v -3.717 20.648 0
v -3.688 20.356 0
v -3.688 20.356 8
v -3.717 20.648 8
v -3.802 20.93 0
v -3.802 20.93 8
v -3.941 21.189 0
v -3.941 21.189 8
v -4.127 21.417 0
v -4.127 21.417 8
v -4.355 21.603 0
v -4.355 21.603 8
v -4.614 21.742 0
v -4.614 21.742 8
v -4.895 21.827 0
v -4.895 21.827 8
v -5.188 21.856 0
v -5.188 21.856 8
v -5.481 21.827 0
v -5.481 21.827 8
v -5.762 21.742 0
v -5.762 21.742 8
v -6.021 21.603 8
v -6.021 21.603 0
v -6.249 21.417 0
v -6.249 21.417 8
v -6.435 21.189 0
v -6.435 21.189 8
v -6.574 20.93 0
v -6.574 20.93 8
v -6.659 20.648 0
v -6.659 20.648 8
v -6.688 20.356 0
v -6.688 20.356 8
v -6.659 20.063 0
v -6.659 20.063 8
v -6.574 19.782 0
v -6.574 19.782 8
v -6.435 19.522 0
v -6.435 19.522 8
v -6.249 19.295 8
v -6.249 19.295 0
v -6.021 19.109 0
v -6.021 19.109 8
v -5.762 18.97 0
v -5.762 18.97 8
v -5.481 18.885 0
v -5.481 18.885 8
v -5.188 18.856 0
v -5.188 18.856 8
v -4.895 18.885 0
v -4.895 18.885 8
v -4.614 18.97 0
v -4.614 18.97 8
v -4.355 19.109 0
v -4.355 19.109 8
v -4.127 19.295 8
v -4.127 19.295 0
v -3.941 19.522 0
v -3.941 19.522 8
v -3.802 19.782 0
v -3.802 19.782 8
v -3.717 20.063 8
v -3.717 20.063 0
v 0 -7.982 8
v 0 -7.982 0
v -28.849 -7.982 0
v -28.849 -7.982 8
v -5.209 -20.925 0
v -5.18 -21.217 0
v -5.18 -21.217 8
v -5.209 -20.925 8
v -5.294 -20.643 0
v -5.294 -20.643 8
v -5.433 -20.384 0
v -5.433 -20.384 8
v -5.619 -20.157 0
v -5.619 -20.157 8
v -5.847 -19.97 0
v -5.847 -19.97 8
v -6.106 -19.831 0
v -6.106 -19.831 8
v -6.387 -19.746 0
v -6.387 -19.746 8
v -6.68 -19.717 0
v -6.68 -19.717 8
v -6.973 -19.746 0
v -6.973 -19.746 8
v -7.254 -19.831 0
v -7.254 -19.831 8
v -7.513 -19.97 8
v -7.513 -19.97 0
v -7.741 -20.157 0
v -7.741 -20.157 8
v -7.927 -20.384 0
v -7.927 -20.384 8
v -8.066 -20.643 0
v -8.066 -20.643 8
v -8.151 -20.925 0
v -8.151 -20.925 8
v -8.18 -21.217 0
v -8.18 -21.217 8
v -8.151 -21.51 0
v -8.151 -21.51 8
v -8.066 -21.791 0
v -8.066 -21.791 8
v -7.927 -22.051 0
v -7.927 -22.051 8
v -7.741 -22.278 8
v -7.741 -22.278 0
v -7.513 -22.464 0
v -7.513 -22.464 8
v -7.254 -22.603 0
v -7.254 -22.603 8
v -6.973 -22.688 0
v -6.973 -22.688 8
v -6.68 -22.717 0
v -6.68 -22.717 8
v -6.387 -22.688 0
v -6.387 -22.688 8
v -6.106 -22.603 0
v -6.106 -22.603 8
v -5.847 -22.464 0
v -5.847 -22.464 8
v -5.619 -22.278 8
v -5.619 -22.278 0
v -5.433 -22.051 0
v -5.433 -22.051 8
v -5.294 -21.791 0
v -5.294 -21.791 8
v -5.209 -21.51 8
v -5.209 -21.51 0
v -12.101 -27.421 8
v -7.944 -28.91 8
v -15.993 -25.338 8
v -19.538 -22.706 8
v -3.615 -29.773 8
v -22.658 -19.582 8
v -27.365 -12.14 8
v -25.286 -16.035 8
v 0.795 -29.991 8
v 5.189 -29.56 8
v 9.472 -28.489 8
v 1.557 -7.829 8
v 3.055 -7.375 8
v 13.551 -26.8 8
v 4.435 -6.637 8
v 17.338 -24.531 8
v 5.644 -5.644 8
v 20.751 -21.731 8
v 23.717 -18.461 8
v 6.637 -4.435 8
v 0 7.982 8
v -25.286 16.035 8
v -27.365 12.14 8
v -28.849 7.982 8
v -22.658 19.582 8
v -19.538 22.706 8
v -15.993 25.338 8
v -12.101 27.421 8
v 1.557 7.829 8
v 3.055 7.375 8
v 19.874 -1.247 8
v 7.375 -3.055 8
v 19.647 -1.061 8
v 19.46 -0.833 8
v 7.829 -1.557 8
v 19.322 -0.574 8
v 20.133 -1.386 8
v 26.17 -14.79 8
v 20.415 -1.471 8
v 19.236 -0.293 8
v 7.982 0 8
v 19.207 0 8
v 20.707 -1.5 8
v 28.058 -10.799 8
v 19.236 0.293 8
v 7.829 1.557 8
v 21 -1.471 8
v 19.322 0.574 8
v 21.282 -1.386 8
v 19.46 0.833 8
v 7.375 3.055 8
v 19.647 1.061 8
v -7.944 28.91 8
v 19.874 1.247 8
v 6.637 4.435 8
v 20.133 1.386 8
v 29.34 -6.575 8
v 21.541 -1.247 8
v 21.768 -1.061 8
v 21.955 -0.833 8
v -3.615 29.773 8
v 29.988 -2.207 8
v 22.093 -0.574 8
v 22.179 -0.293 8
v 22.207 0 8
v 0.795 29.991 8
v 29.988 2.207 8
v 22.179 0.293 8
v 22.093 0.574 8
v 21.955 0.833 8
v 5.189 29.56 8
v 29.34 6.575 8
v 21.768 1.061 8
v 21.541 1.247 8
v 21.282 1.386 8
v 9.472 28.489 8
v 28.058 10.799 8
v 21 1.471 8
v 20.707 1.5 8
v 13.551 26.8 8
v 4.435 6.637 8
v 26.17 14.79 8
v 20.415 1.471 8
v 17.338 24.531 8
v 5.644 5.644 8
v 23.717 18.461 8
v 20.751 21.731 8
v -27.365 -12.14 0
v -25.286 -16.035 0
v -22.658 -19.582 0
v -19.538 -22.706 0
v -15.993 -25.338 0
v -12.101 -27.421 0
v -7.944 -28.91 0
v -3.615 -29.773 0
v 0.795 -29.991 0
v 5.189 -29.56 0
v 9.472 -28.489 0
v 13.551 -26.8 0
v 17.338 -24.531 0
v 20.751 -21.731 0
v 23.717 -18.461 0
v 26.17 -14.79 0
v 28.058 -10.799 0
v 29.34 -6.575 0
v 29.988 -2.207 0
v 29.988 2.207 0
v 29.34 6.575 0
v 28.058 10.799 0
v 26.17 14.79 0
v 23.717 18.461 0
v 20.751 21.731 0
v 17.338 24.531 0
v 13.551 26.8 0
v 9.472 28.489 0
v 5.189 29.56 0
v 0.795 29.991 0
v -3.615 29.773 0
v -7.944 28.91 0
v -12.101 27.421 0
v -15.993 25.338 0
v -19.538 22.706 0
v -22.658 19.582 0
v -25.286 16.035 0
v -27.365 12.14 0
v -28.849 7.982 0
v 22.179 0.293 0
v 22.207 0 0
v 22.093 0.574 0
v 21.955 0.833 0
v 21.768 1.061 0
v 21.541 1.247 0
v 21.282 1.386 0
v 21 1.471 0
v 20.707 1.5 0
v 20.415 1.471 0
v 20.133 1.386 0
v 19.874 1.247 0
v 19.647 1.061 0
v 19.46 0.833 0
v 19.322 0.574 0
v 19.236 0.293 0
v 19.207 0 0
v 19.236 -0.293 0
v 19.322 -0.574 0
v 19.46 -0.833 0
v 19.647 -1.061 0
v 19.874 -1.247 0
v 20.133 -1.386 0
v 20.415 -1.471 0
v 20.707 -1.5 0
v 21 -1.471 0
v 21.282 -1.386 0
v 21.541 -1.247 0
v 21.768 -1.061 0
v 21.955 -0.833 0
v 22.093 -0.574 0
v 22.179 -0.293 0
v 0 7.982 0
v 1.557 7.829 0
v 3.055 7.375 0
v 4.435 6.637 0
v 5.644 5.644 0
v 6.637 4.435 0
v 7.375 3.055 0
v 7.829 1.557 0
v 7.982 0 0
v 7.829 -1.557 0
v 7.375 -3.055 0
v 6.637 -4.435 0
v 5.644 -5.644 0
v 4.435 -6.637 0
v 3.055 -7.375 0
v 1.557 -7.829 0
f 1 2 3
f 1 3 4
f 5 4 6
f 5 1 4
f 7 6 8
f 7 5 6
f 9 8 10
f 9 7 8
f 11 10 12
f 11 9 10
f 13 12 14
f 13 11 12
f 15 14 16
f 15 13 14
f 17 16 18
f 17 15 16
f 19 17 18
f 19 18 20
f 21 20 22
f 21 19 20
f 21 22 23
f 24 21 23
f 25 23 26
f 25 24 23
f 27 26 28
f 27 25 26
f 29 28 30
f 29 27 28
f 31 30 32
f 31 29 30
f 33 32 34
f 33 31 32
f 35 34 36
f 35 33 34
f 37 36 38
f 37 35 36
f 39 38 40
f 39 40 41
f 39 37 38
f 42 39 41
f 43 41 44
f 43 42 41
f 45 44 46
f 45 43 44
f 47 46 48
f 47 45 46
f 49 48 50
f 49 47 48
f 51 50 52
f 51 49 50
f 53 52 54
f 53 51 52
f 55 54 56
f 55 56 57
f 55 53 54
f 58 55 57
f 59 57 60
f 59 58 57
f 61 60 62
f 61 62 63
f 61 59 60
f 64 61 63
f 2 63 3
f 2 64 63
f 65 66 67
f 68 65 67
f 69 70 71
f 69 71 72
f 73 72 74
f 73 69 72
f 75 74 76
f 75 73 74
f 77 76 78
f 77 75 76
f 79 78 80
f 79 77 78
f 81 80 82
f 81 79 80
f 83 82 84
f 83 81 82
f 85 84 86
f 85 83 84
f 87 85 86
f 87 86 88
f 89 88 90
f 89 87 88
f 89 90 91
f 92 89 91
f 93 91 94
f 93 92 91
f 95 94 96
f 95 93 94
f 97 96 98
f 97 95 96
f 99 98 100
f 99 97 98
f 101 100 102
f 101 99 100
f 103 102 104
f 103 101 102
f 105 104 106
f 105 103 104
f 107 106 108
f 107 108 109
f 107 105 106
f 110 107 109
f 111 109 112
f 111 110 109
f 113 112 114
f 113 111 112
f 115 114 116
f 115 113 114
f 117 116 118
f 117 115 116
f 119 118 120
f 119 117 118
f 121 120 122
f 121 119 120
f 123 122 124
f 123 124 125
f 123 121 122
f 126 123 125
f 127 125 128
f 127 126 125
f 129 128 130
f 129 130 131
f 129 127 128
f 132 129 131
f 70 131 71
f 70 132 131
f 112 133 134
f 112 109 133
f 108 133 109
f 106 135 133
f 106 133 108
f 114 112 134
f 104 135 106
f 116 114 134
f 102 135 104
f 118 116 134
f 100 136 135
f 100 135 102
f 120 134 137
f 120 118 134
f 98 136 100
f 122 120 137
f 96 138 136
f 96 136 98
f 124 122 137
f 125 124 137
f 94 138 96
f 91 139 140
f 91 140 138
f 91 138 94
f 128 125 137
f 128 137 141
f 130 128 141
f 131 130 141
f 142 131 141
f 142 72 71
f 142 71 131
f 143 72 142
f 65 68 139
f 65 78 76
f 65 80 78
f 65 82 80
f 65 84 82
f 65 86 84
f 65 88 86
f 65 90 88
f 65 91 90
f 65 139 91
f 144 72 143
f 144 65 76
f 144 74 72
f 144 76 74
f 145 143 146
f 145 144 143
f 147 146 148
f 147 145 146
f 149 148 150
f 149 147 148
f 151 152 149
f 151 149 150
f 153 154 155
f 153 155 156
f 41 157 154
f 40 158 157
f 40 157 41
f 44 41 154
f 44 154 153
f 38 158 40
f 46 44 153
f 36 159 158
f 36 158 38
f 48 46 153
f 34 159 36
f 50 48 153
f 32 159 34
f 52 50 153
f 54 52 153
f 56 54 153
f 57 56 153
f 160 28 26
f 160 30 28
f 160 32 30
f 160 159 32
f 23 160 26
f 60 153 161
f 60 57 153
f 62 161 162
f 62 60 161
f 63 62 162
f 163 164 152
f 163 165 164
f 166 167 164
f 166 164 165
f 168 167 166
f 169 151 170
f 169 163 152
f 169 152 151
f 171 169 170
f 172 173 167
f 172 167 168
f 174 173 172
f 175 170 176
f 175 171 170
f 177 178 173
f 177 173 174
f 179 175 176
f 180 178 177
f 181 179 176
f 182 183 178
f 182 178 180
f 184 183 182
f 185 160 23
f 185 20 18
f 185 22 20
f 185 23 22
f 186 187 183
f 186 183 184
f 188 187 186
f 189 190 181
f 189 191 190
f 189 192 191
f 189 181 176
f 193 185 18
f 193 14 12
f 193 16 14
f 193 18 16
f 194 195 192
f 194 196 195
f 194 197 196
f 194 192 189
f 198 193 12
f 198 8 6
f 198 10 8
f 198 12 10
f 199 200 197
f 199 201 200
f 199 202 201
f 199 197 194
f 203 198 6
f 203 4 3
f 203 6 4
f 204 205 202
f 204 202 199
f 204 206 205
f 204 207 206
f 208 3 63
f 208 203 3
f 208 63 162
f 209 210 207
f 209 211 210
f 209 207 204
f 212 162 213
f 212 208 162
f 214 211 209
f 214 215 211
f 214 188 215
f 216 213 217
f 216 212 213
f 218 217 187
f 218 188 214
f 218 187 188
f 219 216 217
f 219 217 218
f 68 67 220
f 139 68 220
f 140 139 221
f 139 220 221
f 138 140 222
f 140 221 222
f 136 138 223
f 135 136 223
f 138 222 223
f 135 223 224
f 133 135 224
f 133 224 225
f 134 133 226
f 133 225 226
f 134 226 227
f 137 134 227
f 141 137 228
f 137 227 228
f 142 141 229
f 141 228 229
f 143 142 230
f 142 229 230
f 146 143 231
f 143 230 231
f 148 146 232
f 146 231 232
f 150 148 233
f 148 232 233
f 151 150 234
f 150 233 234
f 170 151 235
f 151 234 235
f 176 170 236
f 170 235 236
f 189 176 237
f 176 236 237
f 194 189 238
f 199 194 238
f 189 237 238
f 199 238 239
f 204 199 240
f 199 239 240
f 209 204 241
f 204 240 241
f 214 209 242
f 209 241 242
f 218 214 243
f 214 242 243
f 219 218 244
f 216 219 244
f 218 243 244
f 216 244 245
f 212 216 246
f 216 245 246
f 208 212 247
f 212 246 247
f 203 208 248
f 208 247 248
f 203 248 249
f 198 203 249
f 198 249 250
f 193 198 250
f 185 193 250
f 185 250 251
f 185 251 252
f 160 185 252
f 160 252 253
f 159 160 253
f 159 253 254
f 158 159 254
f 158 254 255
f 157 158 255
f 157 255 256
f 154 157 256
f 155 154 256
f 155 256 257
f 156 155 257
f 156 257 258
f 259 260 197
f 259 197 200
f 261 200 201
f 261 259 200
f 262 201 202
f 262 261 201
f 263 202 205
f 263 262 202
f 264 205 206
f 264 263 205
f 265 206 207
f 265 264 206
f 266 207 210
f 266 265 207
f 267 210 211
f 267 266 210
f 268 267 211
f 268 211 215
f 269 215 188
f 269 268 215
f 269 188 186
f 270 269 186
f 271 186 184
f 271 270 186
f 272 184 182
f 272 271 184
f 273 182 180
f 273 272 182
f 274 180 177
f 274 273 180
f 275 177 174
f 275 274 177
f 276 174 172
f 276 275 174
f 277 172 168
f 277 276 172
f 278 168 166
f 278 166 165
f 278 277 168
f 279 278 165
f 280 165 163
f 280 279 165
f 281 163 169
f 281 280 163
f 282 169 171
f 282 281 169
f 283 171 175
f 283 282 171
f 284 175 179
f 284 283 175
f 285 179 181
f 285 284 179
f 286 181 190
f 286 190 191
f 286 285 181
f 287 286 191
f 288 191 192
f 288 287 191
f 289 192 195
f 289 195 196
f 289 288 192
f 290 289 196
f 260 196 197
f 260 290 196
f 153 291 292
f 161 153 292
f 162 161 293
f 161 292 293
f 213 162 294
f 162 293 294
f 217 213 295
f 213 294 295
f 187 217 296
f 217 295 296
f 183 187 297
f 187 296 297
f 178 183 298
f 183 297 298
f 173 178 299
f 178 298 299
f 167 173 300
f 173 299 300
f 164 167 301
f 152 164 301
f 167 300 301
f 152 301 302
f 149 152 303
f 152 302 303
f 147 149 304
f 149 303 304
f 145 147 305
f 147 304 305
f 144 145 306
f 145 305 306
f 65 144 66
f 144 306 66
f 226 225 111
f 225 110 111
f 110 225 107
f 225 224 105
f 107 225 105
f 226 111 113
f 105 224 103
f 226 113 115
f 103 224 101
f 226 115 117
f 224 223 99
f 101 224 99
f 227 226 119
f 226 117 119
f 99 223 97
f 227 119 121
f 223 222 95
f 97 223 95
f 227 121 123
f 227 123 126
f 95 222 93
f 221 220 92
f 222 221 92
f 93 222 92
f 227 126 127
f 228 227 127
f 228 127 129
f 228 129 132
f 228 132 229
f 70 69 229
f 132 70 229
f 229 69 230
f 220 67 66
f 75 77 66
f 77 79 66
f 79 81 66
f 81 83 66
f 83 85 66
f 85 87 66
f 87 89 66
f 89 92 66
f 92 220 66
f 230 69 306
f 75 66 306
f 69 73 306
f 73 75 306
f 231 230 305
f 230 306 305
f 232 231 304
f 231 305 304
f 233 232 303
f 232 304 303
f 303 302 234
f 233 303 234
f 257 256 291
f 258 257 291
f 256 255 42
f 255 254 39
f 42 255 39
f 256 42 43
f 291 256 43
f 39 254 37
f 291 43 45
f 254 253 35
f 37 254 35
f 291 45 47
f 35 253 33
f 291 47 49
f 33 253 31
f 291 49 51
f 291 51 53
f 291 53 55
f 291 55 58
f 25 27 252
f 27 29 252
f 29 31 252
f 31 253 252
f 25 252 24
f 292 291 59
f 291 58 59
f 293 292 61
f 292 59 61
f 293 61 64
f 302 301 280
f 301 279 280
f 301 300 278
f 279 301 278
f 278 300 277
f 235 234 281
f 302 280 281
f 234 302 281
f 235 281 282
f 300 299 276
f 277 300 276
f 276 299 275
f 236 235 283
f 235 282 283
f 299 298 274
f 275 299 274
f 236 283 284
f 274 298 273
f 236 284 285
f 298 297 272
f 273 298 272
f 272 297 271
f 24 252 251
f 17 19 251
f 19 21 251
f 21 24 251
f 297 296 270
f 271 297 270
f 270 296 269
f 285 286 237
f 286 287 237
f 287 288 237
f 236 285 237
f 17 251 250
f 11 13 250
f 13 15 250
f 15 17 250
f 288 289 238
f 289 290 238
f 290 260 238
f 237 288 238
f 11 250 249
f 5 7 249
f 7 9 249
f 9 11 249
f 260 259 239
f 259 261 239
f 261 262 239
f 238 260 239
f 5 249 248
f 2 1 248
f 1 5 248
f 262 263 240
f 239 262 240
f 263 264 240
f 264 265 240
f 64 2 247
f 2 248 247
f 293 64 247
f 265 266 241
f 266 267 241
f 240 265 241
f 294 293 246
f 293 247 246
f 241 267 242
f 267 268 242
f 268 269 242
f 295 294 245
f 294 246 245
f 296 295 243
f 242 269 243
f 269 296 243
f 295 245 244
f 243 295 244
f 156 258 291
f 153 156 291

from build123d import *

# Parameters (mm, degrees)
F0_R     = 1.5
F1_DEPTH = 8


with BuildPart() as f1:
    # F0 (on Top) → F1 (new body)
    with BuildSketch(Plane.XY):
        with BuildLine():
            ThreePointArc((0, 7.982175), (7.982175, 0), (0, -7.982175))
            Line((0, -7.982175), (-28.84924, -7.982175))
            ThreePointArc((-28.84924, -7.982175), (30.069351, 0), (-28.84924, 7.982175))
            Line((-28.84924, 7.982175), (0, 7.982175))
        make_face()
        with Locations((-6.679961, -21.217225)):
            Circle(F0_R, mode=Mode.SUBTRACT)
        with Locations((-5.188019, 20.355852)):
            Circle(F0_R, mode=Mode.SUBTRACT)
        with Locations((20.707492, 0)):
            Circle(F0_R, mode=Mode.SUBTRACT)
    extrude(amount=F1_DEPTH)


solid = f1.part
